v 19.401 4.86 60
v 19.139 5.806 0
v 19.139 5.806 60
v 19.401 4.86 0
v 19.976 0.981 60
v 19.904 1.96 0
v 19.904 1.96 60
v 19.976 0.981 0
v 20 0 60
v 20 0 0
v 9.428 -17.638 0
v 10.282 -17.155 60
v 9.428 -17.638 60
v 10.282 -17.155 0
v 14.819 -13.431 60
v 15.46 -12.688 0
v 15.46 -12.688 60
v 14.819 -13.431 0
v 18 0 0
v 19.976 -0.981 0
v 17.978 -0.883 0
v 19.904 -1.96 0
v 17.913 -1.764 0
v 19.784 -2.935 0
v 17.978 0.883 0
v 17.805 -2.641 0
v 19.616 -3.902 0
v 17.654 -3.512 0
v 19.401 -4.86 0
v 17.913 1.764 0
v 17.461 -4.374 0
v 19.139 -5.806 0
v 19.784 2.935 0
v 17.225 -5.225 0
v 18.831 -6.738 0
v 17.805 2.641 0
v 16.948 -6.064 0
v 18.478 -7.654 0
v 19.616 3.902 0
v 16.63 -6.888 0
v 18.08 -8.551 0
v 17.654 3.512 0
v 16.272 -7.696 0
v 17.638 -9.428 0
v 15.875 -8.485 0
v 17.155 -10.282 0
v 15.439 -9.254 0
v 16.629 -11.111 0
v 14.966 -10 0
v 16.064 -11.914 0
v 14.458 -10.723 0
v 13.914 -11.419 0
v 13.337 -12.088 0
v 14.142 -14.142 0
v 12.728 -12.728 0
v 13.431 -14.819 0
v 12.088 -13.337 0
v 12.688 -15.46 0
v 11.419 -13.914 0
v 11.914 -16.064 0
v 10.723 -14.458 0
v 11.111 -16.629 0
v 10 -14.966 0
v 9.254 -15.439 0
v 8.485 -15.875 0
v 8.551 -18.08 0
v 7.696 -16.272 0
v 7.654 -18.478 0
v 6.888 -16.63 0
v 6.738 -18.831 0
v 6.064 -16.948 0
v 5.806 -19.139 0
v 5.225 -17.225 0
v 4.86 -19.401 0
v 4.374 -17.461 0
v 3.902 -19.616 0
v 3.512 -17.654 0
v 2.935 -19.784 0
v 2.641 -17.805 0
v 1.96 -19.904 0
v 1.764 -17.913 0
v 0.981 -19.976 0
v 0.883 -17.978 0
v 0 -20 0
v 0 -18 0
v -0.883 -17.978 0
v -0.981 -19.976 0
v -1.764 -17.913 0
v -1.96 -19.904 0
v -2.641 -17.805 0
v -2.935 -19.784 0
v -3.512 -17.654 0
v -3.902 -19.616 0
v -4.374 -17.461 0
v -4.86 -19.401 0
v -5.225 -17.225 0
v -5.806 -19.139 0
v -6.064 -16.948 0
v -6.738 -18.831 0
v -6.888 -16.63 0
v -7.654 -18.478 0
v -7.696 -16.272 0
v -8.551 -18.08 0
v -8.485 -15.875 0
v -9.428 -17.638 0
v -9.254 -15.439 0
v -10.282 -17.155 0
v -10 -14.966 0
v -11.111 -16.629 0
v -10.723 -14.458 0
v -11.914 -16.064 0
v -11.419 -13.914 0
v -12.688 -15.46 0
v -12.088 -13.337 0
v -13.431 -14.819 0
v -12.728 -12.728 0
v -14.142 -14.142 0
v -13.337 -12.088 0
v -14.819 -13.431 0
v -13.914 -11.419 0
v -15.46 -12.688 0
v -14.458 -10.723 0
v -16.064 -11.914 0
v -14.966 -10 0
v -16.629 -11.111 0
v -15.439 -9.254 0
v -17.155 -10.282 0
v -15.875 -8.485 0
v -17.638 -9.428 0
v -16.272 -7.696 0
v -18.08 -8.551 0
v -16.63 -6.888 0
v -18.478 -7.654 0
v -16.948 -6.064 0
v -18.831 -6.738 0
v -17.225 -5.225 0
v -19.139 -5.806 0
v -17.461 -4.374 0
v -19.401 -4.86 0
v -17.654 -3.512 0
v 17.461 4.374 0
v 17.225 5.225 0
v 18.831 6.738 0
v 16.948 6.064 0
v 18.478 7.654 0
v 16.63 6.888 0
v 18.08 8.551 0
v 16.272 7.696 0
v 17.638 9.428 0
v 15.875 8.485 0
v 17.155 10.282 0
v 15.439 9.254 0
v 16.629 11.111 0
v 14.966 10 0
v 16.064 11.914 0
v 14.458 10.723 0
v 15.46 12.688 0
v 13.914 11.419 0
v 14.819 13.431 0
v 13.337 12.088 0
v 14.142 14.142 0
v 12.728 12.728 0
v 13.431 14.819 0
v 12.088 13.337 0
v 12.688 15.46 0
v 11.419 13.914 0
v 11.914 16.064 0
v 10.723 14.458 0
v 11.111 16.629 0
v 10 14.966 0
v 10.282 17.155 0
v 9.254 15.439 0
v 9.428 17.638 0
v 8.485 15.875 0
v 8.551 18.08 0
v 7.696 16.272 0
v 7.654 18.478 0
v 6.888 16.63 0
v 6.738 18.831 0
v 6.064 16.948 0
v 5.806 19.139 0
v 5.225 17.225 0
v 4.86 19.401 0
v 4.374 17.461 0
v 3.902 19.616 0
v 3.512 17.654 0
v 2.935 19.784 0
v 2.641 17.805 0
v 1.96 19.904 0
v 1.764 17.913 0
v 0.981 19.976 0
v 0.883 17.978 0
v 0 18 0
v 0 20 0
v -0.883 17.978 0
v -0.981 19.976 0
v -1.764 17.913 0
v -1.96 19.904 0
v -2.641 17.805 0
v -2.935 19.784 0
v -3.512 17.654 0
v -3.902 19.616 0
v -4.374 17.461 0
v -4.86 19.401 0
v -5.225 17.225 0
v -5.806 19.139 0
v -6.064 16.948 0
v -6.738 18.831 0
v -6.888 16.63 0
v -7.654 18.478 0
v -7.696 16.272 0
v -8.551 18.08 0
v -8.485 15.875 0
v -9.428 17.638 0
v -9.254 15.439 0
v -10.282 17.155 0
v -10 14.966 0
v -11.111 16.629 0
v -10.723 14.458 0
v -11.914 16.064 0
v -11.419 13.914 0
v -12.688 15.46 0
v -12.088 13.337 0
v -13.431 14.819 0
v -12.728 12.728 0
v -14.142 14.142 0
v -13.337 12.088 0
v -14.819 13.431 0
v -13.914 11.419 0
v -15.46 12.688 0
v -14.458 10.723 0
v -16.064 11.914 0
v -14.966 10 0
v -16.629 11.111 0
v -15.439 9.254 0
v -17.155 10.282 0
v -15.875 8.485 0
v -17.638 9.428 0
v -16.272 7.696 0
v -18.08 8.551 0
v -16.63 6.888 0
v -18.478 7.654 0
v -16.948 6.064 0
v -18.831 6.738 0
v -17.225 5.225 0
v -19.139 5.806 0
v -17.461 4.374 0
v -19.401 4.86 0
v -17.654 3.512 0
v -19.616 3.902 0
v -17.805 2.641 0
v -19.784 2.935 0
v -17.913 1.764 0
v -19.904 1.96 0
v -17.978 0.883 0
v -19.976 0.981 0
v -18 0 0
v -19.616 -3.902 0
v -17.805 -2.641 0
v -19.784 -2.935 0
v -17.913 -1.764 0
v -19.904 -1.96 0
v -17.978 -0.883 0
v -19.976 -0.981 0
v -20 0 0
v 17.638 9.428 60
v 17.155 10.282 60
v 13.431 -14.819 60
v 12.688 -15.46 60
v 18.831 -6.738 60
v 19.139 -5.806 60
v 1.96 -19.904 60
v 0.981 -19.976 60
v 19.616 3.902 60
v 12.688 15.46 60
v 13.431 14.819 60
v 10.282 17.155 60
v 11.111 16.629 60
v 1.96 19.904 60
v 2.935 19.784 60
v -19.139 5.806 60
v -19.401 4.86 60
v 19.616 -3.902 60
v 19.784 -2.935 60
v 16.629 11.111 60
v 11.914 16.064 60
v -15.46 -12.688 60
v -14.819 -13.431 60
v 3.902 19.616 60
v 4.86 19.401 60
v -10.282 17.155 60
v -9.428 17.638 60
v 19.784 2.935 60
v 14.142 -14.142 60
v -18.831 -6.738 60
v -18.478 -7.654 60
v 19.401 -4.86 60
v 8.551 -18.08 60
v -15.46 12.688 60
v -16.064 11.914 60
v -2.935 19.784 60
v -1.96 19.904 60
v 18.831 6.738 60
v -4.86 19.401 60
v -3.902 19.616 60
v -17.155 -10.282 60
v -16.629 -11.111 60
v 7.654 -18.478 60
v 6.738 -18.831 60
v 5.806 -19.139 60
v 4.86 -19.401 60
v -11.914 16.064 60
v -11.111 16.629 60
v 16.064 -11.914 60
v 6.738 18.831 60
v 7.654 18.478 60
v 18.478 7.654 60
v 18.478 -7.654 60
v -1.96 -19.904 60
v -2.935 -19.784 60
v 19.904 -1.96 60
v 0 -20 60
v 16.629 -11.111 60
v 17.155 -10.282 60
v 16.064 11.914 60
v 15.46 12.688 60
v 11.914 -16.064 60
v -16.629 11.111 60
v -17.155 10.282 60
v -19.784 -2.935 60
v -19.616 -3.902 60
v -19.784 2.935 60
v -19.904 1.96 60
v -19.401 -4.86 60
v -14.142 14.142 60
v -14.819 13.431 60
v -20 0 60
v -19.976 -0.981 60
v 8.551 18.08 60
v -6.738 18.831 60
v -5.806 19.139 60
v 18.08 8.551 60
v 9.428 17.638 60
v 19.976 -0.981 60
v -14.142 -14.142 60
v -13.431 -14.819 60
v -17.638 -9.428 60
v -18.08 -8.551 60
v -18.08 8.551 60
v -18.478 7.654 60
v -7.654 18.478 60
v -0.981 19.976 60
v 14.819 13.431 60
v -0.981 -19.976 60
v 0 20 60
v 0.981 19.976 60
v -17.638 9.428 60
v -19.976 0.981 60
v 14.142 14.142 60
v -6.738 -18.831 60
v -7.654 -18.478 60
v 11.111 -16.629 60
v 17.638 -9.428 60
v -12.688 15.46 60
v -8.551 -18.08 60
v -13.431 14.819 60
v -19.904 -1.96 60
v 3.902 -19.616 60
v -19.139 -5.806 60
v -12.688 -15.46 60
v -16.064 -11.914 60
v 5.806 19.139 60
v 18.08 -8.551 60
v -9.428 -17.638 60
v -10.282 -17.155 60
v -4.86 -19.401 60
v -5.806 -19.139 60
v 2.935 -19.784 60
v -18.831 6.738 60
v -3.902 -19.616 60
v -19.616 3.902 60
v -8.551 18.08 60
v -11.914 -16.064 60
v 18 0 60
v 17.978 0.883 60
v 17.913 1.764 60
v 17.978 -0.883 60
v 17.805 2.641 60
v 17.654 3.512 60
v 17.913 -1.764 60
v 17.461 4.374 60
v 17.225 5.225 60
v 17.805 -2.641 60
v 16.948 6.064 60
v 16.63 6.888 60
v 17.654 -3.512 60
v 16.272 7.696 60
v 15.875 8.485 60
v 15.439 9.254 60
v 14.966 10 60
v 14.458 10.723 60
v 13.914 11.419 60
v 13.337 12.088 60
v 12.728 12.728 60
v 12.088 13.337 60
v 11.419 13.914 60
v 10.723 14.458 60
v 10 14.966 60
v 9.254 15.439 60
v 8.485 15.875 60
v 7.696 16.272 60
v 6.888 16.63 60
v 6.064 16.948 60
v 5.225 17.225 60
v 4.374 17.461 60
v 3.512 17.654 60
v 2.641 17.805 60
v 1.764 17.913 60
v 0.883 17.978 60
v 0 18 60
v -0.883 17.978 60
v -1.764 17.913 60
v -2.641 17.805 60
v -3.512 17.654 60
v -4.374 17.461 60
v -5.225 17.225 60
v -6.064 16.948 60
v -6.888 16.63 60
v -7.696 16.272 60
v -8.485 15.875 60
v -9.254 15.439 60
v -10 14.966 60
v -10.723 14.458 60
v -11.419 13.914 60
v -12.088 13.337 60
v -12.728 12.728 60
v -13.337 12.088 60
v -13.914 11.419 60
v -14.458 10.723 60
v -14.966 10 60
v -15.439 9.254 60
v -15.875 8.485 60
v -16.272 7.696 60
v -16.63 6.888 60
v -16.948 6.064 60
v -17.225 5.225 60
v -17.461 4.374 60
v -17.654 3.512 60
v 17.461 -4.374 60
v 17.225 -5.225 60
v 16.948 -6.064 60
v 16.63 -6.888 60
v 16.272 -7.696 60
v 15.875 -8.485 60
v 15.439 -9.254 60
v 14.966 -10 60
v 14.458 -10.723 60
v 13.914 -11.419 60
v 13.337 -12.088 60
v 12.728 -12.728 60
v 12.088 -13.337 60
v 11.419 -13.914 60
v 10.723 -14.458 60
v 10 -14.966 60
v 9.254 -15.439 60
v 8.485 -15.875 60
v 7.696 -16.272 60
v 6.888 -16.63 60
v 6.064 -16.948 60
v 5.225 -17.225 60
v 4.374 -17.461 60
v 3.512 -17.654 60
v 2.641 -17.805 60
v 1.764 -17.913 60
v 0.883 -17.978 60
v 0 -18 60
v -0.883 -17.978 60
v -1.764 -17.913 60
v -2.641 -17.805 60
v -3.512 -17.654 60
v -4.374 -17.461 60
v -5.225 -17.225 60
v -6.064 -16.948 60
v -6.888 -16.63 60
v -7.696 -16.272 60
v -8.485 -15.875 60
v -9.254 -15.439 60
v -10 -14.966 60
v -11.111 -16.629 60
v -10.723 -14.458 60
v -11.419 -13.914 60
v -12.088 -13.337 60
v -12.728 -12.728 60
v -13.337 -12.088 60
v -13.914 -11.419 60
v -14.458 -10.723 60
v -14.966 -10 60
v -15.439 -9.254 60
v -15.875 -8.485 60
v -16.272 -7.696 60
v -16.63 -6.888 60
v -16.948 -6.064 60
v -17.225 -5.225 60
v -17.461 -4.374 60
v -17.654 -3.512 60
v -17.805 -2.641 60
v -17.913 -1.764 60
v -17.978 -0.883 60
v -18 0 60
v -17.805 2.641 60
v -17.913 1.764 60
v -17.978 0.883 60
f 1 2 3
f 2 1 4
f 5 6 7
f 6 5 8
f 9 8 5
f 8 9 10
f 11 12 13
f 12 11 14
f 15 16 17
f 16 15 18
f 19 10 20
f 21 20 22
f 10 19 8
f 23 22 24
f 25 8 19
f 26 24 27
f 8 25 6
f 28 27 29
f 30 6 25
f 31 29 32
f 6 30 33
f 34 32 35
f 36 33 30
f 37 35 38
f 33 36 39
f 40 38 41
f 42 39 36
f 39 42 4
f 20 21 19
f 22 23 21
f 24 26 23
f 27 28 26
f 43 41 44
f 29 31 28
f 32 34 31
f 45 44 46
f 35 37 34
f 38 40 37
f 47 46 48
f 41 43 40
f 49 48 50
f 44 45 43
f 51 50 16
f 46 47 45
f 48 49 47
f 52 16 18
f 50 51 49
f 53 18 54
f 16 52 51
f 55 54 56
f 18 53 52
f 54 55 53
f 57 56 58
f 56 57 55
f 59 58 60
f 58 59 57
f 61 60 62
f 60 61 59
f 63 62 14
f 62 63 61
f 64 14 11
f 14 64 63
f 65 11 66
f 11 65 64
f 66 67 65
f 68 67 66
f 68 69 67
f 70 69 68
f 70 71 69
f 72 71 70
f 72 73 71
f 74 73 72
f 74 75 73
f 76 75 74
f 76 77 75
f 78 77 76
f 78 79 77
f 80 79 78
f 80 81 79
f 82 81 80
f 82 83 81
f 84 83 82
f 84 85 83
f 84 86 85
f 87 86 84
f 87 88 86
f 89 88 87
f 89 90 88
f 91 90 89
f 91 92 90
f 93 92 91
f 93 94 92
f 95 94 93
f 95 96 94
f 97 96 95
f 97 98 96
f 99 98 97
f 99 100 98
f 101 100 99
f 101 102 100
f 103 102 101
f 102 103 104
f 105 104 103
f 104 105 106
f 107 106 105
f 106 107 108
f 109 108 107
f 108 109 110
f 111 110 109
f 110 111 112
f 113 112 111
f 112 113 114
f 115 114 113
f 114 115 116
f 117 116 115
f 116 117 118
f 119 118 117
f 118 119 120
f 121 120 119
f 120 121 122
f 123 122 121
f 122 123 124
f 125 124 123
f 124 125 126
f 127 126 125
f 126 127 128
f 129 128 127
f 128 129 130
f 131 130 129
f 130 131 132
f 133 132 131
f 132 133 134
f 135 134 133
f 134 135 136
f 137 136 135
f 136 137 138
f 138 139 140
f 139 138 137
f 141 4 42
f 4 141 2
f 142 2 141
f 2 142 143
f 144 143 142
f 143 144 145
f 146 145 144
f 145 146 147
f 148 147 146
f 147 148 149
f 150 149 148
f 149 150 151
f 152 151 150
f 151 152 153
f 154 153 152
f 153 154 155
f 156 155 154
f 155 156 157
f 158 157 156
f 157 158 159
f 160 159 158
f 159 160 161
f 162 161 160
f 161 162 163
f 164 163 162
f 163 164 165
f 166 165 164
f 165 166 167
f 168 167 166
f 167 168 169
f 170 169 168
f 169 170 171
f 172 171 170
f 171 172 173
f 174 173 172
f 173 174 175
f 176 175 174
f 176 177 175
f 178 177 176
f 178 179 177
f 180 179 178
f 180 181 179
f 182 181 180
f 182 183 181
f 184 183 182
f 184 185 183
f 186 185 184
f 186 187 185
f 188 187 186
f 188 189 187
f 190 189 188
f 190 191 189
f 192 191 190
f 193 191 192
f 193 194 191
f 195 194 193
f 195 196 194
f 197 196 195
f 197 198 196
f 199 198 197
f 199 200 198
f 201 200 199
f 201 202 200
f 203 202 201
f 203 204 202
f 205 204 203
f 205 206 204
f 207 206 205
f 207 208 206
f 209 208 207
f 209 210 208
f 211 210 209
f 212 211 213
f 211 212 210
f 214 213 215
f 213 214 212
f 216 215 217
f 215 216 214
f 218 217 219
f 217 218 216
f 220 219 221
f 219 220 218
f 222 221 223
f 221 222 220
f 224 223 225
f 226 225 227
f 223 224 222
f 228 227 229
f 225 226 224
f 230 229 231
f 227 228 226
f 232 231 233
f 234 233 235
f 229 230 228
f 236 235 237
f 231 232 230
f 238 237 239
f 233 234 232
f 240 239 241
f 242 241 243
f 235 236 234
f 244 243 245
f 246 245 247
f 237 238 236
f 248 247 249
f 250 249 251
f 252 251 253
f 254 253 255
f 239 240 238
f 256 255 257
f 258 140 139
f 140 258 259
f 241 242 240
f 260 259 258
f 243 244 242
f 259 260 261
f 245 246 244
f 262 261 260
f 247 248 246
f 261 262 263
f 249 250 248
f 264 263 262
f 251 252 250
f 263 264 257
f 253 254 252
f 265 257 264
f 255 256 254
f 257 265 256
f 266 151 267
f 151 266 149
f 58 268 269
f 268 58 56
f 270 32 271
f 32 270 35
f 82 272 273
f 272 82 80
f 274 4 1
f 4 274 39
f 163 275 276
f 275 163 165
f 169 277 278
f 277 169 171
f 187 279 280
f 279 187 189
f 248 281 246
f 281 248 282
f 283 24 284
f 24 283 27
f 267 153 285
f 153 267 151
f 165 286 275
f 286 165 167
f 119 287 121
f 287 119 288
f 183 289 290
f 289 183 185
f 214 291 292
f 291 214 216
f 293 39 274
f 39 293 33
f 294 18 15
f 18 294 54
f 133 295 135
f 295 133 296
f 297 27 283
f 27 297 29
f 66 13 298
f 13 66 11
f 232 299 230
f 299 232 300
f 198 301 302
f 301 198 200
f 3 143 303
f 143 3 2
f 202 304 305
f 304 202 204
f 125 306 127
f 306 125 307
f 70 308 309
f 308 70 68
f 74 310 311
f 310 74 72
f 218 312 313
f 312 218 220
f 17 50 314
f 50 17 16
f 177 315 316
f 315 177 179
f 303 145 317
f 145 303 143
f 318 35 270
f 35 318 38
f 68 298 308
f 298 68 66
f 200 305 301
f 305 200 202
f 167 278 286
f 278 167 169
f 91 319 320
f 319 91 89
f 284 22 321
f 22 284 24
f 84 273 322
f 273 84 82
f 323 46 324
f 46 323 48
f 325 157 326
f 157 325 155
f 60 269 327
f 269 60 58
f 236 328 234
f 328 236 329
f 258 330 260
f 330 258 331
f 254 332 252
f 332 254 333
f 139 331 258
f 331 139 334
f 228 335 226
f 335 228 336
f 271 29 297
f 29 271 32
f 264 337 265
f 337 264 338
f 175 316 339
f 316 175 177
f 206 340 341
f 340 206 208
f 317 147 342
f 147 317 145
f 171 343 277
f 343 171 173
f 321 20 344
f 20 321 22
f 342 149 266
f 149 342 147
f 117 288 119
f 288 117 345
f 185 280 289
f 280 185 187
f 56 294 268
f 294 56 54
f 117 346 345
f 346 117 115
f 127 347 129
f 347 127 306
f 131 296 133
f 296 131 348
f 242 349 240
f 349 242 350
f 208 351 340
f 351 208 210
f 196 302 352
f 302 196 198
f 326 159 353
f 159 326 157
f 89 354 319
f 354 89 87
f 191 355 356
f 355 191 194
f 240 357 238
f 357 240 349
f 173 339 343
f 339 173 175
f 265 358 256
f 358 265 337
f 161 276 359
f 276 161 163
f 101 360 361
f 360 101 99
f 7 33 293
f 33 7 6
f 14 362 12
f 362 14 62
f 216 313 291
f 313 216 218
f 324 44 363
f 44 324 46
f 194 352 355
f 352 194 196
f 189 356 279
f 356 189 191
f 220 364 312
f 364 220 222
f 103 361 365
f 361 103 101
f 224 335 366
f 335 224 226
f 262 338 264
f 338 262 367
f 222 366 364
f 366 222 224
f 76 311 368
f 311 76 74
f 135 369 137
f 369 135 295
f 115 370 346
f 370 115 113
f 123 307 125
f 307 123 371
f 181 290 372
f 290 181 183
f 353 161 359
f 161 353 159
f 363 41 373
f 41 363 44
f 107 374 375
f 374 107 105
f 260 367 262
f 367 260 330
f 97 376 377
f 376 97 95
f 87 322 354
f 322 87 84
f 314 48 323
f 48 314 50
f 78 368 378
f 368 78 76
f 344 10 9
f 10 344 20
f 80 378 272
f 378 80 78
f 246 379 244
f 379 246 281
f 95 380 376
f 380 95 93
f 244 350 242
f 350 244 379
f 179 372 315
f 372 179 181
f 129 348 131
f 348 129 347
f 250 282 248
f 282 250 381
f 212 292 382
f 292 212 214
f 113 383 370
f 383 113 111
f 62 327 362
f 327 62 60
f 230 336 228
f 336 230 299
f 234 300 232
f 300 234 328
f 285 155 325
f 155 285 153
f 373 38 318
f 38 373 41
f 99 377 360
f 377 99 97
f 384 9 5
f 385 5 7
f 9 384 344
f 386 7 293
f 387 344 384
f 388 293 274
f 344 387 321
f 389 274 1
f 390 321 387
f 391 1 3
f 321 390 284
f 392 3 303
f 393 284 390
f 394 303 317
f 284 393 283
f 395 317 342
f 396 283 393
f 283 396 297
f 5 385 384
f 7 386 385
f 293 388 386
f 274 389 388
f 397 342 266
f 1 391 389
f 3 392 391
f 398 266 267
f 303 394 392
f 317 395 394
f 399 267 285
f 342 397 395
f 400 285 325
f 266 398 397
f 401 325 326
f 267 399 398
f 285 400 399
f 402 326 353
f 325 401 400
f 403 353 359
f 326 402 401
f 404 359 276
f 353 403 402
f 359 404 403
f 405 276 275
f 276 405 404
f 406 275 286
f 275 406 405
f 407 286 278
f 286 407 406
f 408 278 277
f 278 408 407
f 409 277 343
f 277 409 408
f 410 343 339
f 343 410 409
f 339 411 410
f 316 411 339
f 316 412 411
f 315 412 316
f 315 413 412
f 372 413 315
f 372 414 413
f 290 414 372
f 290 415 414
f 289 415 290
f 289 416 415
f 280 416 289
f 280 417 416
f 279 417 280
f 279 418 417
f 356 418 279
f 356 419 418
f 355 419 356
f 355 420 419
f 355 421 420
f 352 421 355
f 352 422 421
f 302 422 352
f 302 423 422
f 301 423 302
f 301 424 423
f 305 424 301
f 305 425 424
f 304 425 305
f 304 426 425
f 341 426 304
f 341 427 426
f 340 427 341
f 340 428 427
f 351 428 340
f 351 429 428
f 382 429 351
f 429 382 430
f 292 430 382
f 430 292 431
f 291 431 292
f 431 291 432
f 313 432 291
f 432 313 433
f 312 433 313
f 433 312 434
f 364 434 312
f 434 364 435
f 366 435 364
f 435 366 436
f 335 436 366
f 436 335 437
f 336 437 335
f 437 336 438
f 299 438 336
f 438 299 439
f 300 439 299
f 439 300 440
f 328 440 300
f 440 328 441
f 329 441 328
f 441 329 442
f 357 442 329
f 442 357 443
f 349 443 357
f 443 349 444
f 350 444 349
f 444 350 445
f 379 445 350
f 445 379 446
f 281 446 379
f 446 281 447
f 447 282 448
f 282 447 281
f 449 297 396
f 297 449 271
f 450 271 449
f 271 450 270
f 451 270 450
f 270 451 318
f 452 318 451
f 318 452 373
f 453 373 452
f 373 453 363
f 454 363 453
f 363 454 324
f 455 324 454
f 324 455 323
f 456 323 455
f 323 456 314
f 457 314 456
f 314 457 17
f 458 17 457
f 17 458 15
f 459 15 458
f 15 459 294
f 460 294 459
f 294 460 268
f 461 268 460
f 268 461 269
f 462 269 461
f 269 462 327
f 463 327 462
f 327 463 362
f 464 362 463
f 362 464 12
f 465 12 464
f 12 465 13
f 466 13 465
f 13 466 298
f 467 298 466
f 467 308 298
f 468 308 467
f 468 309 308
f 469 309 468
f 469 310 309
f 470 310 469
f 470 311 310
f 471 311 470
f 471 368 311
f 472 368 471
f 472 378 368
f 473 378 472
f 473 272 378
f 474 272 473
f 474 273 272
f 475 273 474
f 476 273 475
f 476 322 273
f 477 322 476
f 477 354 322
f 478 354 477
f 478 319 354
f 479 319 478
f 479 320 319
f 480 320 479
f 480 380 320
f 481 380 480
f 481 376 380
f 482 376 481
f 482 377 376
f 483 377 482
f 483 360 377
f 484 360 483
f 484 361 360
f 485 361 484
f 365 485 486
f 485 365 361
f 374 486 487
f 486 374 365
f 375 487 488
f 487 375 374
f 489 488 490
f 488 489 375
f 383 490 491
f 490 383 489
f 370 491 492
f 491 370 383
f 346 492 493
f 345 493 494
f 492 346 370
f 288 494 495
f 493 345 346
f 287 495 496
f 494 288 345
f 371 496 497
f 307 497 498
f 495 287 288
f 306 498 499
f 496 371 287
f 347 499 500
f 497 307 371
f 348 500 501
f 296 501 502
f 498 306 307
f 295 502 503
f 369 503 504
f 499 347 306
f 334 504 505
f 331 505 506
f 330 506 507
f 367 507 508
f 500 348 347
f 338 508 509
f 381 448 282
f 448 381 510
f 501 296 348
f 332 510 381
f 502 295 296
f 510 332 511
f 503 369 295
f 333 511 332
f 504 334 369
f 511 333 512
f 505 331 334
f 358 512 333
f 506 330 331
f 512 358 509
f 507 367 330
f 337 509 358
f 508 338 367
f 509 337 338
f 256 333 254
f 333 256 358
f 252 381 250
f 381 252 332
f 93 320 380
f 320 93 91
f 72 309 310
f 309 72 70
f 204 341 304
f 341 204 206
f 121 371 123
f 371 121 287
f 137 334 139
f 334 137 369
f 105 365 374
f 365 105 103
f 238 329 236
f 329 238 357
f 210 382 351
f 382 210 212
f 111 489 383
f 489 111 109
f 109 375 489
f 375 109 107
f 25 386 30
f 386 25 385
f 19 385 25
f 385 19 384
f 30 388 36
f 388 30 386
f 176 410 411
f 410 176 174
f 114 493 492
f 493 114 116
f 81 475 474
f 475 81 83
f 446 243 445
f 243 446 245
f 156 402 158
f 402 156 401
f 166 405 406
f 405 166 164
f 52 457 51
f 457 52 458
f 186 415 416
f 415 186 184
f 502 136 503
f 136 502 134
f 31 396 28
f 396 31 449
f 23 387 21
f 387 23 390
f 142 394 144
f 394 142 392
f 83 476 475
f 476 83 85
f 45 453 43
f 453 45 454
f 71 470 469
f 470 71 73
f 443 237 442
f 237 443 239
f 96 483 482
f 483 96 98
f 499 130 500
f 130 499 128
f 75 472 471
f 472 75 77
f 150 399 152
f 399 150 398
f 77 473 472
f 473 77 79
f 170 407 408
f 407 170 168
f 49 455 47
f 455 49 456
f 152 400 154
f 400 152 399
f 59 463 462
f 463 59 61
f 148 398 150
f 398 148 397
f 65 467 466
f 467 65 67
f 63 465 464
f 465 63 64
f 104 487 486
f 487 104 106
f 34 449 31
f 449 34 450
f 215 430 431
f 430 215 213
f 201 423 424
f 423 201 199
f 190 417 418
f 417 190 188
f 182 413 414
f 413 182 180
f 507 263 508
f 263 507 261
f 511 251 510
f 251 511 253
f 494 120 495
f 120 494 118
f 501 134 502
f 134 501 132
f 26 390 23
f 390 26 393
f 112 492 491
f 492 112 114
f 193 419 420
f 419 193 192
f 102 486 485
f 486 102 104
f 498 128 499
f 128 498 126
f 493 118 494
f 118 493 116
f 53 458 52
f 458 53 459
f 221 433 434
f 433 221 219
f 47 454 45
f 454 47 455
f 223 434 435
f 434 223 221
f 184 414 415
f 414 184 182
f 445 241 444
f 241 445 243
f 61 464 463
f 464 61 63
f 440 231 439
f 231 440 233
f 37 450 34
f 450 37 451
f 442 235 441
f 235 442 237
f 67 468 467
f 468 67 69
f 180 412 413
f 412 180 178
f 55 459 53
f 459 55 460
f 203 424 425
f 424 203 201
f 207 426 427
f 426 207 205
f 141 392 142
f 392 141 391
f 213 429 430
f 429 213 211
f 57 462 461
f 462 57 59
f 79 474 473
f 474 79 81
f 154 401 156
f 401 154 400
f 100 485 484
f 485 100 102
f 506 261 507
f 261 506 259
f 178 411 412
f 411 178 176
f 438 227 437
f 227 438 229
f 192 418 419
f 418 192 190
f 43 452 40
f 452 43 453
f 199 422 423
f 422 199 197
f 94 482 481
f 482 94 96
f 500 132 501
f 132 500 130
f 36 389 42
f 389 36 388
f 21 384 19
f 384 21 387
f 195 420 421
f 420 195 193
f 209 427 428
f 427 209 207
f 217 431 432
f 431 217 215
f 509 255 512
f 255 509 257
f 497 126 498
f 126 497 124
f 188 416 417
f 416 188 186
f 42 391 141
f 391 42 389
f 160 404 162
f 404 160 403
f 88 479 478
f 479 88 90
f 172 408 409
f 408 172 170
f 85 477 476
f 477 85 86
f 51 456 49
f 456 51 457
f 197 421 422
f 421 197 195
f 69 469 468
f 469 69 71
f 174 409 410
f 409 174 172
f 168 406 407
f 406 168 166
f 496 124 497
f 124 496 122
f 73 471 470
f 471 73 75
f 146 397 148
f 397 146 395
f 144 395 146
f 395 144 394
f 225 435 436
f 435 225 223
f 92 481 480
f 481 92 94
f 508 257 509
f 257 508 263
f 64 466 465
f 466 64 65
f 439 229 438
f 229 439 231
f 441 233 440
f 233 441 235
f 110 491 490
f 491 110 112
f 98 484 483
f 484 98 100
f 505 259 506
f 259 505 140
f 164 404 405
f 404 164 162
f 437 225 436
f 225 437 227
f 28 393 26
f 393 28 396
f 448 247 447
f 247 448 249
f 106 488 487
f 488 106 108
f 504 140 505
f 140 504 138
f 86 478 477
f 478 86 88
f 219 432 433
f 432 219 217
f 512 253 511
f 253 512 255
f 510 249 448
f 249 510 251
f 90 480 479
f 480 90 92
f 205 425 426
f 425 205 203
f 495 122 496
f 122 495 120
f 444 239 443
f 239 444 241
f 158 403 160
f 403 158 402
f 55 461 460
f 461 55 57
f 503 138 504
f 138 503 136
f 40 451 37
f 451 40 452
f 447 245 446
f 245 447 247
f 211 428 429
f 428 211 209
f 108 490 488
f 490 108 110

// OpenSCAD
// file: common_params.scad
cylinder_radius = 20.000000;
cylinder_height = 60.000000;
wall_thickness = 2.000000;

cap_thickness = 2.000000;

rod_radius = 2.000000;
rod_height = 50.000000;

ring_outer_radius = 8.000000;
ring_inner_radius = 4.000000;
ring_thickness = 3.000000;
ring_z = 40.000000;

$fn = 128;
// main file
include <common_params.scad>;

difference() {
    cylinder(h = cylinder_height, r = cylinder_radius);
    translate([0, 0, -0.1])
        cylinder(h = cylinder_height + 0.2, r = cylinder_radius - wall_thickness);
}
